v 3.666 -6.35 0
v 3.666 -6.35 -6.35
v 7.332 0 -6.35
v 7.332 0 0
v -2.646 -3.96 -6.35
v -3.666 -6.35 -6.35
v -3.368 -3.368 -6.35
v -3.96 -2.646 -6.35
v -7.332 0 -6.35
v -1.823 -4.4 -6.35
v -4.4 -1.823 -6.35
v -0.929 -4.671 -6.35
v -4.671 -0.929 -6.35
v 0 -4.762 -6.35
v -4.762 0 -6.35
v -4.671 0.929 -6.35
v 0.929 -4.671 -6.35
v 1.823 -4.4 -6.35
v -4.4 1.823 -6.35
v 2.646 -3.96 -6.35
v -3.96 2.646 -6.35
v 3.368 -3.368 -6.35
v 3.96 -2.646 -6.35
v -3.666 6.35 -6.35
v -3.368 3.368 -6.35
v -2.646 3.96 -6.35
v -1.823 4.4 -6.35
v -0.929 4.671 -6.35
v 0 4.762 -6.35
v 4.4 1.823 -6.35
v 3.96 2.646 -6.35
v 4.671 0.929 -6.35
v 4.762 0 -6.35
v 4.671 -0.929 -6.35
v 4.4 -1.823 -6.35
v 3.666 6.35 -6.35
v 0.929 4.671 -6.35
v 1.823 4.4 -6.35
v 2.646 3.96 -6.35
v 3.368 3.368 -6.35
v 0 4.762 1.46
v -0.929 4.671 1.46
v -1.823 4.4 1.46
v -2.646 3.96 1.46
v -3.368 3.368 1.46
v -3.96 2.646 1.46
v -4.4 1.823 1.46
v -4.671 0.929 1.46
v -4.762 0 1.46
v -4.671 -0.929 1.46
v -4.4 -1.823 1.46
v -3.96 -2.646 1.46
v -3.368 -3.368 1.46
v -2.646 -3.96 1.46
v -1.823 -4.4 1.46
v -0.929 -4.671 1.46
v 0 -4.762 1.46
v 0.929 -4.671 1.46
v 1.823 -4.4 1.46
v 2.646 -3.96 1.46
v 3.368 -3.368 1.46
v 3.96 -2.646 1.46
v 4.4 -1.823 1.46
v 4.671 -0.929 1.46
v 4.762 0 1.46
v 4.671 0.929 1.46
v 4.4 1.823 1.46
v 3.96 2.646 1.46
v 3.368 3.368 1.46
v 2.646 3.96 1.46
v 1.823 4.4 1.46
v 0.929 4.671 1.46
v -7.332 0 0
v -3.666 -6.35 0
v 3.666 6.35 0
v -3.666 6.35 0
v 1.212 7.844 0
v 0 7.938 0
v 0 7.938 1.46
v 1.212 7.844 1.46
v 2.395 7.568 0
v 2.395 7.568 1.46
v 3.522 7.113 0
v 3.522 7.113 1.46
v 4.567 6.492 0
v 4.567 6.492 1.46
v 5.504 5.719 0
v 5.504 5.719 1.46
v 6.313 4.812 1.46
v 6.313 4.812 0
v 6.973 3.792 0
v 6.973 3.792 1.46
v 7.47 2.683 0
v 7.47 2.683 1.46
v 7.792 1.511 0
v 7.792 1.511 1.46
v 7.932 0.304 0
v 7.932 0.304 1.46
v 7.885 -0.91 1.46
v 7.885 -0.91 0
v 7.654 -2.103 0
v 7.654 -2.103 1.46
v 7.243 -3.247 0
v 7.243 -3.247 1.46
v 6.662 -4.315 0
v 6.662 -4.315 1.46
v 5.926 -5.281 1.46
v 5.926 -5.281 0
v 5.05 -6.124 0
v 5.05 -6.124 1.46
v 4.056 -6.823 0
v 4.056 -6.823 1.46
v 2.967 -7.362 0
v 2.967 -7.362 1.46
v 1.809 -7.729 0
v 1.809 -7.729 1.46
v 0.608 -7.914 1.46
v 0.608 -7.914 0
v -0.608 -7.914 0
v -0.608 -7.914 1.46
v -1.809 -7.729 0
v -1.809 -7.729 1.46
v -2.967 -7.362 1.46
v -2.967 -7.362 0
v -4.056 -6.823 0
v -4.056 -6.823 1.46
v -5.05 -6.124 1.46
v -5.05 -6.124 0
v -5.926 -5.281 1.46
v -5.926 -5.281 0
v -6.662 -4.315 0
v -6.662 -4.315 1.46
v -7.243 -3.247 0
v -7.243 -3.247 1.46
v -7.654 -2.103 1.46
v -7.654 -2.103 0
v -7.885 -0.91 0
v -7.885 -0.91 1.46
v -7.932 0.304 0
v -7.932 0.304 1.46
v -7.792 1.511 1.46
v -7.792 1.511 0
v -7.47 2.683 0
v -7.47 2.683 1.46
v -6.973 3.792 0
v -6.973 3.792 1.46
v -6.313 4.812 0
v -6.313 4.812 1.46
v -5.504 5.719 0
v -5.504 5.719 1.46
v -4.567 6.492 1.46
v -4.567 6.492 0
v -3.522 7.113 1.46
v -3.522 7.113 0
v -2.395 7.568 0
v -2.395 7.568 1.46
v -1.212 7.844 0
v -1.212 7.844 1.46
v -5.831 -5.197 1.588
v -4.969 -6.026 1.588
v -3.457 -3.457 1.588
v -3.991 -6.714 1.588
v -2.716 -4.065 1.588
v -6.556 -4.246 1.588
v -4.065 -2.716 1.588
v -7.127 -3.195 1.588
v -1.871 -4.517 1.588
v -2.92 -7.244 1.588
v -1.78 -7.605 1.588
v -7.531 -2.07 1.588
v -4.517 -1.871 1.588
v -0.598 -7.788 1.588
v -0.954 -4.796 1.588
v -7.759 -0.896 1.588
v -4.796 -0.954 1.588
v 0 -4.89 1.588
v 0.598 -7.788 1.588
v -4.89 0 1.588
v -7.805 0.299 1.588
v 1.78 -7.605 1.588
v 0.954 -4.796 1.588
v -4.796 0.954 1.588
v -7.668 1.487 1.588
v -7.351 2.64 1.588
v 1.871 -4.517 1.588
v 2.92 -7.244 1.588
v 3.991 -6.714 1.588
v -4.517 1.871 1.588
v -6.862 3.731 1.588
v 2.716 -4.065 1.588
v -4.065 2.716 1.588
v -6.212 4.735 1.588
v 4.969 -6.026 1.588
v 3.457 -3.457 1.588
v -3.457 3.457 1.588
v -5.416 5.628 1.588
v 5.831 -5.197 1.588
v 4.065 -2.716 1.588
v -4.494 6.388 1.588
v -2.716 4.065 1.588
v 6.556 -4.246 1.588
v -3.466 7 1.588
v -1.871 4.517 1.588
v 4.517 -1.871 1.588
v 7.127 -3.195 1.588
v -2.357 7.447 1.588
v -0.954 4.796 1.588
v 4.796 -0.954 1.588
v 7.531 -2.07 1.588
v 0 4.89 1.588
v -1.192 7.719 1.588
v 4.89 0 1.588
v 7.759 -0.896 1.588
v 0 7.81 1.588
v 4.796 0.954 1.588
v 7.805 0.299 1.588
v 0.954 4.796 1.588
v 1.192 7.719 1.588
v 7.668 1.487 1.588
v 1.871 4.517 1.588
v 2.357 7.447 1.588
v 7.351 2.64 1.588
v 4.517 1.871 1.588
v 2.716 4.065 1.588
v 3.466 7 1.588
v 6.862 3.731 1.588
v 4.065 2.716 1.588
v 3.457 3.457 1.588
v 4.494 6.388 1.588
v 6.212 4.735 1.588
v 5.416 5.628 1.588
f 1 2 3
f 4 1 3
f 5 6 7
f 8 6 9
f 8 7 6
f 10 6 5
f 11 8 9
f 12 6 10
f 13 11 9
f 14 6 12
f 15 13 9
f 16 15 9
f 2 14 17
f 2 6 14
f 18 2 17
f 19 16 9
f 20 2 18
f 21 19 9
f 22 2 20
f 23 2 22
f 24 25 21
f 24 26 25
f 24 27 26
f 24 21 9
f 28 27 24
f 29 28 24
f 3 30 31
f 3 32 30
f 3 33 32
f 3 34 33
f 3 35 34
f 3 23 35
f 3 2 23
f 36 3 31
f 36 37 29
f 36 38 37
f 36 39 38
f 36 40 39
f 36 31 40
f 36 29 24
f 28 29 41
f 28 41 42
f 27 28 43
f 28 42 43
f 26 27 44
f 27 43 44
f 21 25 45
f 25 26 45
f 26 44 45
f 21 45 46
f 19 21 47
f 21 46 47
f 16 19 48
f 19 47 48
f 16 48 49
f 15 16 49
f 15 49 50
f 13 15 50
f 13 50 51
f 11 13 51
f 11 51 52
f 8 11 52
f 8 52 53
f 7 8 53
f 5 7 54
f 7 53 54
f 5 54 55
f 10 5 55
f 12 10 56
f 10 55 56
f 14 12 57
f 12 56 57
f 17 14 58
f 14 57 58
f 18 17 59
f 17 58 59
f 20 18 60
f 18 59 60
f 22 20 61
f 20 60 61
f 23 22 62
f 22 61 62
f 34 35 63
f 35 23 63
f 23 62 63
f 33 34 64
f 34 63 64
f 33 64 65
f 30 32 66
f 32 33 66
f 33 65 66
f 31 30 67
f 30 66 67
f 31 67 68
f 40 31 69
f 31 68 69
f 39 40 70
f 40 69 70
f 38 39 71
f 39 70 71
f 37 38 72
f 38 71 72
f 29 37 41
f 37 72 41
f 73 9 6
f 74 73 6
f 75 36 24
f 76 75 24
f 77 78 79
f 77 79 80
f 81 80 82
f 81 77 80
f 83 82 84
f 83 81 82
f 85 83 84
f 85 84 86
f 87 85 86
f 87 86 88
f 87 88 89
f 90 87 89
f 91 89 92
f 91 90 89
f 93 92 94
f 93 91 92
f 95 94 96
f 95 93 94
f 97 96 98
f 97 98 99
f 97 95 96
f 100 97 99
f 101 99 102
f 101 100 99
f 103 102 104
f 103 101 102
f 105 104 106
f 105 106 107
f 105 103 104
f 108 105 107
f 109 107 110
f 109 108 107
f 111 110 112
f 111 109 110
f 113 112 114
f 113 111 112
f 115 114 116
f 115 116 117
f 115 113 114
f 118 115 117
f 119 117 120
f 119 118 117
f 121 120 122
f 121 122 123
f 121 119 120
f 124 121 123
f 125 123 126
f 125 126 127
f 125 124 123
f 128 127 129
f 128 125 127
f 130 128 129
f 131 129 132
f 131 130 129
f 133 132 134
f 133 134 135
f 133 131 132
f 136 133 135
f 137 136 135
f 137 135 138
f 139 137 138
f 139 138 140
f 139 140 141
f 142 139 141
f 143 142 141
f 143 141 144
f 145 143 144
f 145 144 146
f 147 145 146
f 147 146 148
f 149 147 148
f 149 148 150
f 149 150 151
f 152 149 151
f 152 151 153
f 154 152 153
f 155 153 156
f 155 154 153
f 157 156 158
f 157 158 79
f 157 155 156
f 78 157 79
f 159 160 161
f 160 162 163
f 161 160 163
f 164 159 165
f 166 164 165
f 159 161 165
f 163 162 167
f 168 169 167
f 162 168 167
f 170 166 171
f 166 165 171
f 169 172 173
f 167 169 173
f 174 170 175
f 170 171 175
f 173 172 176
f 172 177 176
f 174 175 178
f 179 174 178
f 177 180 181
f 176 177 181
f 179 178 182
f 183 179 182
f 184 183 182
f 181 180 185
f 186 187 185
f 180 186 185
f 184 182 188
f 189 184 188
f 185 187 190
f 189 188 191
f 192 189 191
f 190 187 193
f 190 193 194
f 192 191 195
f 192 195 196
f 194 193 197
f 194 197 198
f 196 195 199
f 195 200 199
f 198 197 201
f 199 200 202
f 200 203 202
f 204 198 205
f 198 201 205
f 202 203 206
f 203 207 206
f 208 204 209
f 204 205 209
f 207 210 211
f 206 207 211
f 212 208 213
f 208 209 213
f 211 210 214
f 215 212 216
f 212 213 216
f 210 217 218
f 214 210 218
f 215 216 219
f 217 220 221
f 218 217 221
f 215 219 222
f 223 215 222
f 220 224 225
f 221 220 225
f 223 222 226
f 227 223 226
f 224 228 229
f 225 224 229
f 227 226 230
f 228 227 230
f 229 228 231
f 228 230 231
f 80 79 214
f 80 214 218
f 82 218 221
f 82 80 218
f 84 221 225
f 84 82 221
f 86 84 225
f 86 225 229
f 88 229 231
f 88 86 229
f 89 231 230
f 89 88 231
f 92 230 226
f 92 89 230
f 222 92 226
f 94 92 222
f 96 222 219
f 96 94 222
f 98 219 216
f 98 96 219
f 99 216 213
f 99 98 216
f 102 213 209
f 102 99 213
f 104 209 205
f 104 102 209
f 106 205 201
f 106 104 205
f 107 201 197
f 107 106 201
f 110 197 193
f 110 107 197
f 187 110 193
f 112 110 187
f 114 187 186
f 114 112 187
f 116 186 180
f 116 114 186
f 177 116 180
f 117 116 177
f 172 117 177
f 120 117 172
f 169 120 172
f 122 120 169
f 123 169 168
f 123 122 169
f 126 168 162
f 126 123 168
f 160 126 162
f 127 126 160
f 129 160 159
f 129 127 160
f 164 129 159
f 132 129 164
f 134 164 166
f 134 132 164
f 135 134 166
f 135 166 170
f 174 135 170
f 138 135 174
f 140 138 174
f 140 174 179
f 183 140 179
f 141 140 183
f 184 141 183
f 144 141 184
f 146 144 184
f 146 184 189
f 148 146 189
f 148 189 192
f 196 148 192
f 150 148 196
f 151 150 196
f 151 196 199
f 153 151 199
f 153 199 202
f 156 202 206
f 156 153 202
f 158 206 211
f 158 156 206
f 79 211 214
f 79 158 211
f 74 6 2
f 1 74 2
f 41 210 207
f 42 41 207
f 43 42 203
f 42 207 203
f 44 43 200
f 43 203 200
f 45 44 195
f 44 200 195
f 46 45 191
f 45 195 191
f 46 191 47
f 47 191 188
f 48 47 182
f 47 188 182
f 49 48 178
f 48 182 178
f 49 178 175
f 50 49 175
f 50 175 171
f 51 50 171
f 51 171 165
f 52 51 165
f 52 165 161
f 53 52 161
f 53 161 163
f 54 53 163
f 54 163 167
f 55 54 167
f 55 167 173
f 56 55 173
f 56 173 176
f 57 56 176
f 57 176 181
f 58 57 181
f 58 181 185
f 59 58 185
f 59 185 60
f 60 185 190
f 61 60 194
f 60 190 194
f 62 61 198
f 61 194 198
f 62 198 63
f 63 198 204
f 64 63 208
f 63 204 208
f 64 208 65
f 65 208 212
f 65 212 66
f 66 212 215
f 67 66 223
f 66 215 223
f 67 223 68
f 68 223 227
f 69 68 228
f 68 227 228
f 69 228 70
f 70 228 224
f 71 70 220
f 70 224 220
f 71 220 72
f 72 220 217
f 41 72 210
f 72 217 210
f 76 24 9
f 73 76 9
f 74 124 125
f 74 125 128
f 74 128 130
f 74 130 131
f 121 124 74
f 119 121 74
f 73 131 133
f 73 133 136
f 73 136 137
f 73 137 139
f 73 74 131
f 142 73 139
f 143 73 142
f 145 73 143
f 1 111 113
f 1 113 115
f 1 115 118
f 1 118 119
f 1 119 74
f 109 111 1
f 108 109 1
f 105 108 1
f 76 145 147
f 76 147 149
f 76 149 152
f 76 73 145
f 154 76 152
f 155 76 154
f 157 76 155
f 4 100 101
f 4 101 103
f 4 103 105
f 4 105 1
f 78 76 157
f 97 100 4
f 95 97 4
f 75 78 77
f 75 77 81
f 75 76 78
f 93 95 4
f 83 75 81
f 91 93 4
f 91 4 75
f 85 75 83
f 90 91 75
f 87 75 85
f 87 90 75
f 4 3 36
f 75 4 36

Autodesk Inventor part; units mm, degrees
ref_plane "YZ Plane" through (0, 0, 0) normal (1, 0, 0) x (0, 1, 0)
ref_plane "XZ Plane" through (0, 0, 0) normal (0, 1, 0) x (-1, 0, 0)
ref_plane "XY Plane" through (0, 0, 0) normal (0, 0, 1) x (1, 0, 0)
sketch "Sketch1" plane through (0, 0, 0) normal (1, 0, 0) x (0, 1, 0)
  line L0 (0, 0) -> (4.7625, 0)
  line L1 (4.7625, 0) -> (4.7625, 1.5875)
  line L2 (4.7625, 1.5875) -> (7.9375, 1.5875)
  line L3 (7.9375, 1.5875) -> (7.9375, 0)
  line L4 (7.9375, 0) -> (6.35, 0)
  line L5 (6.35, 0) -> (6.35, -6.35)
  line L6 (6.35, -6.35) -> (4.7625, -6.35)
  line L7 (4.7625, -6.35) -> (4.7625, 0)
  line L8 (0, 0) -> (0, -7.0209)
  dimension "d0" = 9.525
  dimension "d1" = 12.7
  dimension "d2" = 15.875
  dimension "d3" = 1.5875
  dimension "d4" = 6.35
revolve "Revolution1" add sketch "Sketch1" angle 360 about axis through (0, 0, 0) along (0, 0, -1)
sketch "Sketch2" plane through (0, 0, -6.35) normal (0, 0, -1) x (-1, 0, 0)
  circle A0 centre (0, 0) radius 6.35 projected
  line L0 (-7.3323, 0) -> (-3.6662, 6.35)
  line L1 (-3.6662, 6.35) -> (3.6662, 6.35)
  line L2 (3.6662, 6.35) -> (7.3323, 0)
  line L3 (7.3323, 0) -> (3.6662, -6.35)
  line L4 (3.6662, -6.35) -> (-3.6662, -6.35)
  line L5 (-3.6662, -6.35) -> (-7.3323, 0)
  point P0 (-5.4993, -3.175)
  point P1 (0, -6.35)
  point P2 (-5.4993, 3.175)
  point P3 (5.4993, -3.175)
  point P4 (5.4993, 3.175)
  point P5 (0, 6.35)
extrude "Extrusion1" add sketch "Sketch2" against normal up to surface (6.35 mm away) contours A0 L2 L3 | A0 L1 L2 | L3 L4 A0 | A0 L0 L1 | L4 L5 A0 | A0 L5 L0
chamfer "Chamfer1" distance 0.127 angle 45 2 edges at (0, -7.9375, 1.5875) (0, -4.7625, 1.5875)
properties part number "WCP 500 Hex Bushing" material "Brass, Soft Yellow"
